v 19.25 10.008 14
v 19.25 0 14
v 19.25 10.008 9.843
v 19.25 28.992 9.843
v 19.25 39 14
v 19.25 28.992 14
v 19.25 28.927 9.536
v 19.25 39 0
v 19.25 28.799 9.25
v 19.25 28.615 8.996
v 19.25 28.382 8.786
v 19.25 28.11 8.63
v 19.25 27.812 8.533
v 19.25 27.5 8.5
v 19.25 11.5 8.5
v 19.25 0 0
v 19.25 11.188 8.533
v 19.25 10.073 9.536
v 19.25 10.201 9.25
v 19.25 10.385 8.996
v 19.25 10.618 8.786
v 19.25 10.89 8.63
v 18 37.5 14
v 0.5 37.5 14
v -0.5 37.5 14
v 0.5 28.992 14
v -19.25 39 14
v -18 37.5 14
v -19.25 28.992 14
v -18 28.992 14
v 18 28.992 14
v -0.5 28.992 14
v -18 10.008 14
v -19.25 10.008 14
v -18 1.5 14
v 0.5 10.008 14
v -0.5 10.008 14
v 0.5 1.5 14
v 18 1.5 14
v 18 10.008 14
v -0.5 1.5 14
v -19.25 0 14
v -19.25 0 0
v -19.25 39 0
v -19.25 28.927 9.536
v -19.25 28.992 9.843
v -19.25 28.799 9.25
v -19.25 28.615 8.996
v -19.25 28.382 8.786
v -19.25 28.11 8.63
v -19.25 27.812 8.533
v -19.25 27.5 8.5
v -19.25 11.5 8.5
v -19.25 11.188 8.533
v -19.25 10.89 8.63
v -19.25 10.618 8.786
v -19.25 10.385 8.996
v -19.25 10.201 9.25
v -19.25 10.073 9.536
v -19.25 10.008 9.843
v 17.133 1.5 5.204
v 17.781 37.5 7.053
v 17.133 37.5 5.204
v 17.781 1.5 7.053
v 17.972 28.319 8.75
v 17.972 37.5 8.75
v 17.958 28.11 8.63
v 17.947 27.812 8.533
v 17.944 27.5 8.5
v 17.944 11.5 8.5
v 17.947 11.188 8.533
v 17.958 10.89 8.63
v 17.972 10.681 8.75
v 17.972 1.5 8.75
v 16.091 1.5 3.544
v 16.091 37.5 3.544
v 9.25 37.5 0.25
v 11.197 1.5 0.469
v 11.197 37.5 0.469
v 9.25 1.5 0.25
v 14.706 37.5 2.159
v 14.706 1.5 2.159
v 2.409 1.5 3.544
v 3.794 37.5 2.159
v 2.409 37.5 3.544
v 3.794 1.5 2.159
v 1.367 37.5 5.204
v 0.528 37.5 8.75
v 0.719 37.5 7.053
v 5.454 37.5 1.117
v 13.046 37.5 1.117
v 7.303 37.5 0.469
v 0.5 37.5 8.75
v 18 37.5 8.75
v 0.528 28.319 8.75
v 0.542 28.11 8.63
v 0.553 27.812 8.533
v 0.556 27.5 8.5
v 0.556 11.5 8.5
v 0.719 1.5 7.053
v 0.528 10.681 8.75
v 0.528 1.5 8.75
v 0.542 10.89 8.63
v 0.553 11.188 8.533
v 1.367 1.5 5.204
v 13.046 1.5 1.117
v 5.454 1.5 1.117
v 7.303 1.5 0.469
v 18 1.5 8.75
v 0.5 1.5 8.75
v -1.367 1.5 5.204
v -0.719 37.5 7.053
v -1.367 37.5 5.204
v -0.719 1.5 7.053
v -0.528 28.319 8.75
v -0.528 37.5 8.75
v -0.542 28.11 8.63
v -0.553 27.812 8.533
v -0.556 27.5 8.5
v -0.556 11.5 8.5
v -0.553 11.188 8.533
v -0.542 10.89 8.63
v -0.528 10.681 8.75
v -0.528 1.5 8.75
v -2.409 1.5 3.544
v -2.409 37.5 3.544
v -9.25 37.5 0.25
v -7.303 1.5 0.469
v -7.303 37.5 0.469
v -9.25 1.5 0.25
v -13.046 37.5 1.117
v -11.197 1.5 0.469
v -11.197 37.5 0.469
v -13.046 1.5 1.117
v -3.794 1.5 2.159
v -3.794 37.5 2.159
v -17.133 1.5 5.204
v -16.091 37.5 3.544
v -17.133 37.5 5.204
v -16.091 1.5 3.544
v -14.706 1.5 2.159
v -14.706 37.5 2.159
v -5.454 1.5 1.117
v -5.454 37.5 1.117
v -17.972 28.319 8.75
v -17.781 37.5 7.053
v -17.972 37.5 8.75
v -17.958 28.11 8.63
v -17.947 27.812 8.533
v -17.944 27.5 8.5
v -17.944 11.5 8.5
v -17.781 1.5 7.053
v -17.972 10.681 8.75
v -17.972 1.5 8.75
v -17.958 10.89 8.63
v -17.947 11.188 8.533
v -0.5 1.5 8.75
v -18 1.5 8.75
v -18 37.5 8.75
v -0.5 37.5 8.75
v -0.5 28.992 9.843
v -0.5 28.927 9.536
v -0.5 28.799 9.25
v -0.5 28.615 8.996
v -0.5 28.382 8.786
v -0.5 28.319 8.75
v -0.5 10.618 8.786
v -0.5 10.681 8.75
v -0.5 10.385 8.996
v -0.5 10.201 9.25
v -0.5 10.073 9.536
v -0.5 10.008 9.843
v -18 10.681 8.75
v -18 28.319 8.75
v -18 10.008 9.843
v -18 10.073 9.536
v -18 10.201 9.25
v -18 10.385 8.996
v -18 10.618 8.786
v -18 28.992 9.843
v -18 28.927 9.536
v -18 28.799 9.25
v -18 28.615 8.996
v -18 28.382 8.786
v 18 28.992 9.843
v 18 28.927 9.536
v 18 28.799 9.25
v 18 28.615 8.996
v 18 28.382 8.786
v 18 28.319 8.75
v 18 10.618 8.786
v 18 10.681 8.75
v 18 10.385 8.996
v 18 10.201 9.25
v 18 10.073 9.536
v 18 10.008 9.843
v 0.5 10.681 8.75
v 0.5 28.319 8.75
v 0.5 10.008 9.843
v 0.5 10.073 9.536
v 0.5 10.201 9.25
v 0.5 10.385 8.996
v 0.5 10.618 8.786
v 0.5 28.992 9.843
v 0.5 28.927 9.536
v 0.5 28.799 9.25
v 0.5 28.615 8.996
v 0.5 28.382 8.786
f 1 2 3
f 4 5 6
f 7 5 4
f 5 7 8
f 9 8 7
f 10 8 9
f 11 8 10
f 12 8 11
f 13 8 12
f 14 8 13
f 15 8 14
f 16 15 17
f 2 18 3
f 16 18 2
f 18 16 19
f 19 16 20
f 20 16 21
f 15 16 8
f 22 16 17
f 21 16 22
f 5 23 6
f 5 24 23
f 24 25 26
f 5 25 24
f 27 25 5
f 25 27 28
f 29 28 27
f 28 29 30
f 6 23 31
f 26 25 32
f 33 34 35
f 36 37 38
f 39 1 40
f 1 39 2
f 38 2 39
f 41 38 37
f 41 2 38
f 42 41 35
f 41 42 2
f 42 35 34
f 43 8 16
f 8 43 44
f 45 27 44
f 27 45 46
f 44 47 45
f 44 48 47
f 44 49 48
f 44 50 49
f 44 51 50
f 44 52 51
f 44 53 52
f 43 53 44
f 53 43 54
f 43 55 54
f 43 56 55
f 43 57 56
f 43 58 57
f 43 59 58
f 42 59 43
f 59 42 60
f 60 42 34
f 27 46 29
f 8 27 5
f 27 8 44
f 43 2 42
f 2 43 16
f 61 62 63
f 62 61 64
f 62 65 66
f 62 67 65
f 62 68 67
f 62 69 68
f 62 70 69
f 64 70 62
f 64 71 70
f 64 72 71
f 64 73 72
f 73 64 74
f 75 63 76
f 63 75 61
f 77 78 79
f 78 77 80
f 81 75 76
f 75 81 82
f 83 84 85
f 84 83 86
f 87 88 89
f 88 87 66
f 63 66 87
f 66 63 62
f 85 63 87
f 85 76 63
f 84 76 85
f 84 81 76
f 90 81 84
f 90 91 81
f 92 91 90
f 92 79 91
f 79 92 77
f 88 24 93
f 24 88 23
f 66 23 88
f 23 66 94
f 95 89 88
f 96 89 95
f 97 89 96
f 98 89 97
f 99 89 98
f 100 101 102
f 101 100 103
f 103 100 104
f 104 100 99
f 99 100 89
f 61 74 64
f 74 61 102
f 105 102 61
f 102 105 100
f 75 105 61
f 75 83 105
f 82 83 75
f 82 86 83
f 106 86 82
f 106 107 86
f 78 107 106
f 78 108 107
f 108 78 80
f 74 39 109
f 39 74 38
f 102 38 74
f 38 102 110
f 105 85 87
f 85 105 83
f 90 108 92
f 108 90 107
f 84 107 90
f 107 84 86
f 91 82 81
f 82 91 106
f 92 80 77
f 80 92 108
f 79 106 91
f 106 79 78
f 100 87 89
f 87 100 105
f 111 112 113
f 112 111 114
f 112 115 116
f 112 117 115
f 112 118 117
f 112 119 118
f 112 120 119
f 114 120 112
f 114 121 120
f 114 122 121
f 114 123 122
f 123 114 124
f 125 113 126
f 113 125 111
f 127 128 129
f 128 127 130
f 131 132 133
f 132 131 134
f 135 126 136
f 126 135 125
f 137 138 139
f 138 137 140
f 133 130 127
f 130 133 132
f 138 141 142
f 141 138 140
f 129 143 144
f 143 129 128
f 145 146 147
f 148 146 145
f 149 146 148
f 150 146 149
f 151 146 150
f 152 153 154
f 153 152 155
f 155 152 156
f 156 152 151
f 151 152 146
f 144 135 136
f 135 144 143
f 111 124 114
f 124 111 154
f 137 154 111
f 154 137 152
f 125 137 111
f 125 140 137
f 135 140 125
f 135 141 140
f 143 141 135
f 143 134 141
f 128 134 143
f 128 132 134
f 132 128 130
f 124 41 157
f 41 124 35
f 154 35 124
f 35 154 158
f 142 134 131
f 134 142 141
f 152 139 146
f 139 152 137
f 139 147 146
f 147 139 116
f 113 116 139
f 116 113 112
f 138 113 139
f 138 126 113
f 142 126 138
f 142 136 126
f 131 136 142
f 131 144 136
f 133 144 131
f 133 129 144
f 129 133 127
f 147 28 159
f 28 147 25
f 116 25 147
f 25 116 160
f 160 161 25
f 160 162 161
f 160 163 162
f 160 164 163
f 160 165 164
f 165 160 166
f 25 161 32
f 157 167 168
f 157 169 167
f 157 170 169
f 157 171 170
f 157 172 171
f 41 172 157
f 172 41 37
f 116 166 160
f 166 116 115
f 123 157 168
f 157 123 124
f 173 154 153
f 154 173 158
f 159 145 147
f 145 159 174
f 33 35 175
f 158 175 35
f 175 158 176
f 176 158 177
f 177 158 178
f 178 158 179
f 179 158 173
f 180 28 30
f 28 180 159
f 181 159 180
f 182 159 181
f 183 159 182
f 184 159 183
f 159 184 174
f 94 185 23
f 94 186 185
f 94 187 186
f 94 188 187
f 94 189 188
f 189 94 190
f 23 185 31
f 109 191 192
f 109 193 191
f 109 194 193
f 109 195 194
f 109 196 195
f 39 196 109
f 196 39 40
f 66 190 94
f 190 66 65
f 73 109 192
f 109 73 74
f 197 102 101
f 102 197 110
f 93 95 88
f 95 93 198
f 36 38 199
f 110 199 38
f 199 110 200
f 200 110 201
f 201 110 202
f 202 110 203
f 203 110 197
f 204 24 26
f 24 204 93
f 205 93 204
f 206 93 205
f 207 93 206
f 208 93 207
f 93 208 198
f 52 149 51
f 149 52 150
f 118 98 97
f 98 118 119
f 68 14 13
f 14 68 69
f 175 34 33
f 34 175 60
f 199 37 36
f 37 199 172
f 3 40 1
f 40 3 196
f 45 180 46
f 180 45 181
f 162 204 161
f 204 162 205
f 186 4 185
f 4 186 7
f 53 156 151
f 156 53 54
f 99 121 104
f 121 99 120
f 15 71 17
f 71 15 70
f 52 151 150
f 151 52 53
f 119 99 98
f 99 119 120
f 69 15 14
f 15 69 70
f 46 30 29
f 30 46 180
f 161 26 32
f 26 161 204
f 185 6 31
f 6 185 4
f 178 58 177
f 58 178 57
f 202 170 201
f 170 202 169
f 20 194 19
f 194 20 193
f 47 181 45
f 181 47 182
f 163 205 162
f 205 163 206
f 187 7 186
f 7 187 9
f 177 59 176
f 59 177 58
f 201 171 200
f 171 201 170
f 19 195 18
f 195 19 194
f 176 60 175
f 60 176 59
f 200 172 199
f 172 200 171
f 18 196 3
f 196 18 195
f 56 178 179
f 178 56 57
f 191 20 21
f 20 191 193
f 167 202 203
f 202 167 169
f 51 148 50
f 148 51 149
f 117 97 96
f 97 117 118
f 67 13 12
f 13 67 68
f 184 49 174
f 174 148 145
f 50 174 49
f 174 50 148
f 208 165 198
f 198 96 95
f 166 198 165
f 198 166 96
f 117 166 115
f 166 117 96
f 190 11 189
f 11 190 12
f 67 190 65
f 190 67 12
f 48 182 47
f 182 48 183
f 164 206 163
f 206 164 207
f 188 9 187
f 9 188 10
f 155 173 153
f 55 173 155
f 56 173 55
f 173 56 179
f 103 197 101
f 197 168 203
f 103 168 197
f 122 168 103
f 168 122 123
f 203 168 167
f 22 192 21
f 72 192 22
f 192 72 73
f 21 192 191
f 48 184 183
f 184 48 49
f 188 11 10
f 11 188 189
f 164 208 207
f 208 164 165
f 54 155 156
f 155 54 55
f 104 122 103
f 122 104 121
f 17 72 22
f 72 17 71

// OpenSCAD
bat16340(); //2 batteries side bay side

module bat16340()
difference(){
translate([-19.25,0,0])cube([38.5,39,14]);
translate([9.25,1.5,9])rotate([-90,0,0])cylinder(d=17.5,h=36);
translate([-9.25,1.5,9])rotate([-90,0,0])cylinder(d=17.5,h=36);
translate([-18,1.5,8.75])cube([17.5,36,20]);
translate([0.5,1.5,8.75])cube([17.5,36,20]);
translate([0,19.5,14])
minkowski(){
cube([100,16,8],center=true);
rotate([0,90,0])cylinder(d=3,h=100,$fn=30);
}    
}
